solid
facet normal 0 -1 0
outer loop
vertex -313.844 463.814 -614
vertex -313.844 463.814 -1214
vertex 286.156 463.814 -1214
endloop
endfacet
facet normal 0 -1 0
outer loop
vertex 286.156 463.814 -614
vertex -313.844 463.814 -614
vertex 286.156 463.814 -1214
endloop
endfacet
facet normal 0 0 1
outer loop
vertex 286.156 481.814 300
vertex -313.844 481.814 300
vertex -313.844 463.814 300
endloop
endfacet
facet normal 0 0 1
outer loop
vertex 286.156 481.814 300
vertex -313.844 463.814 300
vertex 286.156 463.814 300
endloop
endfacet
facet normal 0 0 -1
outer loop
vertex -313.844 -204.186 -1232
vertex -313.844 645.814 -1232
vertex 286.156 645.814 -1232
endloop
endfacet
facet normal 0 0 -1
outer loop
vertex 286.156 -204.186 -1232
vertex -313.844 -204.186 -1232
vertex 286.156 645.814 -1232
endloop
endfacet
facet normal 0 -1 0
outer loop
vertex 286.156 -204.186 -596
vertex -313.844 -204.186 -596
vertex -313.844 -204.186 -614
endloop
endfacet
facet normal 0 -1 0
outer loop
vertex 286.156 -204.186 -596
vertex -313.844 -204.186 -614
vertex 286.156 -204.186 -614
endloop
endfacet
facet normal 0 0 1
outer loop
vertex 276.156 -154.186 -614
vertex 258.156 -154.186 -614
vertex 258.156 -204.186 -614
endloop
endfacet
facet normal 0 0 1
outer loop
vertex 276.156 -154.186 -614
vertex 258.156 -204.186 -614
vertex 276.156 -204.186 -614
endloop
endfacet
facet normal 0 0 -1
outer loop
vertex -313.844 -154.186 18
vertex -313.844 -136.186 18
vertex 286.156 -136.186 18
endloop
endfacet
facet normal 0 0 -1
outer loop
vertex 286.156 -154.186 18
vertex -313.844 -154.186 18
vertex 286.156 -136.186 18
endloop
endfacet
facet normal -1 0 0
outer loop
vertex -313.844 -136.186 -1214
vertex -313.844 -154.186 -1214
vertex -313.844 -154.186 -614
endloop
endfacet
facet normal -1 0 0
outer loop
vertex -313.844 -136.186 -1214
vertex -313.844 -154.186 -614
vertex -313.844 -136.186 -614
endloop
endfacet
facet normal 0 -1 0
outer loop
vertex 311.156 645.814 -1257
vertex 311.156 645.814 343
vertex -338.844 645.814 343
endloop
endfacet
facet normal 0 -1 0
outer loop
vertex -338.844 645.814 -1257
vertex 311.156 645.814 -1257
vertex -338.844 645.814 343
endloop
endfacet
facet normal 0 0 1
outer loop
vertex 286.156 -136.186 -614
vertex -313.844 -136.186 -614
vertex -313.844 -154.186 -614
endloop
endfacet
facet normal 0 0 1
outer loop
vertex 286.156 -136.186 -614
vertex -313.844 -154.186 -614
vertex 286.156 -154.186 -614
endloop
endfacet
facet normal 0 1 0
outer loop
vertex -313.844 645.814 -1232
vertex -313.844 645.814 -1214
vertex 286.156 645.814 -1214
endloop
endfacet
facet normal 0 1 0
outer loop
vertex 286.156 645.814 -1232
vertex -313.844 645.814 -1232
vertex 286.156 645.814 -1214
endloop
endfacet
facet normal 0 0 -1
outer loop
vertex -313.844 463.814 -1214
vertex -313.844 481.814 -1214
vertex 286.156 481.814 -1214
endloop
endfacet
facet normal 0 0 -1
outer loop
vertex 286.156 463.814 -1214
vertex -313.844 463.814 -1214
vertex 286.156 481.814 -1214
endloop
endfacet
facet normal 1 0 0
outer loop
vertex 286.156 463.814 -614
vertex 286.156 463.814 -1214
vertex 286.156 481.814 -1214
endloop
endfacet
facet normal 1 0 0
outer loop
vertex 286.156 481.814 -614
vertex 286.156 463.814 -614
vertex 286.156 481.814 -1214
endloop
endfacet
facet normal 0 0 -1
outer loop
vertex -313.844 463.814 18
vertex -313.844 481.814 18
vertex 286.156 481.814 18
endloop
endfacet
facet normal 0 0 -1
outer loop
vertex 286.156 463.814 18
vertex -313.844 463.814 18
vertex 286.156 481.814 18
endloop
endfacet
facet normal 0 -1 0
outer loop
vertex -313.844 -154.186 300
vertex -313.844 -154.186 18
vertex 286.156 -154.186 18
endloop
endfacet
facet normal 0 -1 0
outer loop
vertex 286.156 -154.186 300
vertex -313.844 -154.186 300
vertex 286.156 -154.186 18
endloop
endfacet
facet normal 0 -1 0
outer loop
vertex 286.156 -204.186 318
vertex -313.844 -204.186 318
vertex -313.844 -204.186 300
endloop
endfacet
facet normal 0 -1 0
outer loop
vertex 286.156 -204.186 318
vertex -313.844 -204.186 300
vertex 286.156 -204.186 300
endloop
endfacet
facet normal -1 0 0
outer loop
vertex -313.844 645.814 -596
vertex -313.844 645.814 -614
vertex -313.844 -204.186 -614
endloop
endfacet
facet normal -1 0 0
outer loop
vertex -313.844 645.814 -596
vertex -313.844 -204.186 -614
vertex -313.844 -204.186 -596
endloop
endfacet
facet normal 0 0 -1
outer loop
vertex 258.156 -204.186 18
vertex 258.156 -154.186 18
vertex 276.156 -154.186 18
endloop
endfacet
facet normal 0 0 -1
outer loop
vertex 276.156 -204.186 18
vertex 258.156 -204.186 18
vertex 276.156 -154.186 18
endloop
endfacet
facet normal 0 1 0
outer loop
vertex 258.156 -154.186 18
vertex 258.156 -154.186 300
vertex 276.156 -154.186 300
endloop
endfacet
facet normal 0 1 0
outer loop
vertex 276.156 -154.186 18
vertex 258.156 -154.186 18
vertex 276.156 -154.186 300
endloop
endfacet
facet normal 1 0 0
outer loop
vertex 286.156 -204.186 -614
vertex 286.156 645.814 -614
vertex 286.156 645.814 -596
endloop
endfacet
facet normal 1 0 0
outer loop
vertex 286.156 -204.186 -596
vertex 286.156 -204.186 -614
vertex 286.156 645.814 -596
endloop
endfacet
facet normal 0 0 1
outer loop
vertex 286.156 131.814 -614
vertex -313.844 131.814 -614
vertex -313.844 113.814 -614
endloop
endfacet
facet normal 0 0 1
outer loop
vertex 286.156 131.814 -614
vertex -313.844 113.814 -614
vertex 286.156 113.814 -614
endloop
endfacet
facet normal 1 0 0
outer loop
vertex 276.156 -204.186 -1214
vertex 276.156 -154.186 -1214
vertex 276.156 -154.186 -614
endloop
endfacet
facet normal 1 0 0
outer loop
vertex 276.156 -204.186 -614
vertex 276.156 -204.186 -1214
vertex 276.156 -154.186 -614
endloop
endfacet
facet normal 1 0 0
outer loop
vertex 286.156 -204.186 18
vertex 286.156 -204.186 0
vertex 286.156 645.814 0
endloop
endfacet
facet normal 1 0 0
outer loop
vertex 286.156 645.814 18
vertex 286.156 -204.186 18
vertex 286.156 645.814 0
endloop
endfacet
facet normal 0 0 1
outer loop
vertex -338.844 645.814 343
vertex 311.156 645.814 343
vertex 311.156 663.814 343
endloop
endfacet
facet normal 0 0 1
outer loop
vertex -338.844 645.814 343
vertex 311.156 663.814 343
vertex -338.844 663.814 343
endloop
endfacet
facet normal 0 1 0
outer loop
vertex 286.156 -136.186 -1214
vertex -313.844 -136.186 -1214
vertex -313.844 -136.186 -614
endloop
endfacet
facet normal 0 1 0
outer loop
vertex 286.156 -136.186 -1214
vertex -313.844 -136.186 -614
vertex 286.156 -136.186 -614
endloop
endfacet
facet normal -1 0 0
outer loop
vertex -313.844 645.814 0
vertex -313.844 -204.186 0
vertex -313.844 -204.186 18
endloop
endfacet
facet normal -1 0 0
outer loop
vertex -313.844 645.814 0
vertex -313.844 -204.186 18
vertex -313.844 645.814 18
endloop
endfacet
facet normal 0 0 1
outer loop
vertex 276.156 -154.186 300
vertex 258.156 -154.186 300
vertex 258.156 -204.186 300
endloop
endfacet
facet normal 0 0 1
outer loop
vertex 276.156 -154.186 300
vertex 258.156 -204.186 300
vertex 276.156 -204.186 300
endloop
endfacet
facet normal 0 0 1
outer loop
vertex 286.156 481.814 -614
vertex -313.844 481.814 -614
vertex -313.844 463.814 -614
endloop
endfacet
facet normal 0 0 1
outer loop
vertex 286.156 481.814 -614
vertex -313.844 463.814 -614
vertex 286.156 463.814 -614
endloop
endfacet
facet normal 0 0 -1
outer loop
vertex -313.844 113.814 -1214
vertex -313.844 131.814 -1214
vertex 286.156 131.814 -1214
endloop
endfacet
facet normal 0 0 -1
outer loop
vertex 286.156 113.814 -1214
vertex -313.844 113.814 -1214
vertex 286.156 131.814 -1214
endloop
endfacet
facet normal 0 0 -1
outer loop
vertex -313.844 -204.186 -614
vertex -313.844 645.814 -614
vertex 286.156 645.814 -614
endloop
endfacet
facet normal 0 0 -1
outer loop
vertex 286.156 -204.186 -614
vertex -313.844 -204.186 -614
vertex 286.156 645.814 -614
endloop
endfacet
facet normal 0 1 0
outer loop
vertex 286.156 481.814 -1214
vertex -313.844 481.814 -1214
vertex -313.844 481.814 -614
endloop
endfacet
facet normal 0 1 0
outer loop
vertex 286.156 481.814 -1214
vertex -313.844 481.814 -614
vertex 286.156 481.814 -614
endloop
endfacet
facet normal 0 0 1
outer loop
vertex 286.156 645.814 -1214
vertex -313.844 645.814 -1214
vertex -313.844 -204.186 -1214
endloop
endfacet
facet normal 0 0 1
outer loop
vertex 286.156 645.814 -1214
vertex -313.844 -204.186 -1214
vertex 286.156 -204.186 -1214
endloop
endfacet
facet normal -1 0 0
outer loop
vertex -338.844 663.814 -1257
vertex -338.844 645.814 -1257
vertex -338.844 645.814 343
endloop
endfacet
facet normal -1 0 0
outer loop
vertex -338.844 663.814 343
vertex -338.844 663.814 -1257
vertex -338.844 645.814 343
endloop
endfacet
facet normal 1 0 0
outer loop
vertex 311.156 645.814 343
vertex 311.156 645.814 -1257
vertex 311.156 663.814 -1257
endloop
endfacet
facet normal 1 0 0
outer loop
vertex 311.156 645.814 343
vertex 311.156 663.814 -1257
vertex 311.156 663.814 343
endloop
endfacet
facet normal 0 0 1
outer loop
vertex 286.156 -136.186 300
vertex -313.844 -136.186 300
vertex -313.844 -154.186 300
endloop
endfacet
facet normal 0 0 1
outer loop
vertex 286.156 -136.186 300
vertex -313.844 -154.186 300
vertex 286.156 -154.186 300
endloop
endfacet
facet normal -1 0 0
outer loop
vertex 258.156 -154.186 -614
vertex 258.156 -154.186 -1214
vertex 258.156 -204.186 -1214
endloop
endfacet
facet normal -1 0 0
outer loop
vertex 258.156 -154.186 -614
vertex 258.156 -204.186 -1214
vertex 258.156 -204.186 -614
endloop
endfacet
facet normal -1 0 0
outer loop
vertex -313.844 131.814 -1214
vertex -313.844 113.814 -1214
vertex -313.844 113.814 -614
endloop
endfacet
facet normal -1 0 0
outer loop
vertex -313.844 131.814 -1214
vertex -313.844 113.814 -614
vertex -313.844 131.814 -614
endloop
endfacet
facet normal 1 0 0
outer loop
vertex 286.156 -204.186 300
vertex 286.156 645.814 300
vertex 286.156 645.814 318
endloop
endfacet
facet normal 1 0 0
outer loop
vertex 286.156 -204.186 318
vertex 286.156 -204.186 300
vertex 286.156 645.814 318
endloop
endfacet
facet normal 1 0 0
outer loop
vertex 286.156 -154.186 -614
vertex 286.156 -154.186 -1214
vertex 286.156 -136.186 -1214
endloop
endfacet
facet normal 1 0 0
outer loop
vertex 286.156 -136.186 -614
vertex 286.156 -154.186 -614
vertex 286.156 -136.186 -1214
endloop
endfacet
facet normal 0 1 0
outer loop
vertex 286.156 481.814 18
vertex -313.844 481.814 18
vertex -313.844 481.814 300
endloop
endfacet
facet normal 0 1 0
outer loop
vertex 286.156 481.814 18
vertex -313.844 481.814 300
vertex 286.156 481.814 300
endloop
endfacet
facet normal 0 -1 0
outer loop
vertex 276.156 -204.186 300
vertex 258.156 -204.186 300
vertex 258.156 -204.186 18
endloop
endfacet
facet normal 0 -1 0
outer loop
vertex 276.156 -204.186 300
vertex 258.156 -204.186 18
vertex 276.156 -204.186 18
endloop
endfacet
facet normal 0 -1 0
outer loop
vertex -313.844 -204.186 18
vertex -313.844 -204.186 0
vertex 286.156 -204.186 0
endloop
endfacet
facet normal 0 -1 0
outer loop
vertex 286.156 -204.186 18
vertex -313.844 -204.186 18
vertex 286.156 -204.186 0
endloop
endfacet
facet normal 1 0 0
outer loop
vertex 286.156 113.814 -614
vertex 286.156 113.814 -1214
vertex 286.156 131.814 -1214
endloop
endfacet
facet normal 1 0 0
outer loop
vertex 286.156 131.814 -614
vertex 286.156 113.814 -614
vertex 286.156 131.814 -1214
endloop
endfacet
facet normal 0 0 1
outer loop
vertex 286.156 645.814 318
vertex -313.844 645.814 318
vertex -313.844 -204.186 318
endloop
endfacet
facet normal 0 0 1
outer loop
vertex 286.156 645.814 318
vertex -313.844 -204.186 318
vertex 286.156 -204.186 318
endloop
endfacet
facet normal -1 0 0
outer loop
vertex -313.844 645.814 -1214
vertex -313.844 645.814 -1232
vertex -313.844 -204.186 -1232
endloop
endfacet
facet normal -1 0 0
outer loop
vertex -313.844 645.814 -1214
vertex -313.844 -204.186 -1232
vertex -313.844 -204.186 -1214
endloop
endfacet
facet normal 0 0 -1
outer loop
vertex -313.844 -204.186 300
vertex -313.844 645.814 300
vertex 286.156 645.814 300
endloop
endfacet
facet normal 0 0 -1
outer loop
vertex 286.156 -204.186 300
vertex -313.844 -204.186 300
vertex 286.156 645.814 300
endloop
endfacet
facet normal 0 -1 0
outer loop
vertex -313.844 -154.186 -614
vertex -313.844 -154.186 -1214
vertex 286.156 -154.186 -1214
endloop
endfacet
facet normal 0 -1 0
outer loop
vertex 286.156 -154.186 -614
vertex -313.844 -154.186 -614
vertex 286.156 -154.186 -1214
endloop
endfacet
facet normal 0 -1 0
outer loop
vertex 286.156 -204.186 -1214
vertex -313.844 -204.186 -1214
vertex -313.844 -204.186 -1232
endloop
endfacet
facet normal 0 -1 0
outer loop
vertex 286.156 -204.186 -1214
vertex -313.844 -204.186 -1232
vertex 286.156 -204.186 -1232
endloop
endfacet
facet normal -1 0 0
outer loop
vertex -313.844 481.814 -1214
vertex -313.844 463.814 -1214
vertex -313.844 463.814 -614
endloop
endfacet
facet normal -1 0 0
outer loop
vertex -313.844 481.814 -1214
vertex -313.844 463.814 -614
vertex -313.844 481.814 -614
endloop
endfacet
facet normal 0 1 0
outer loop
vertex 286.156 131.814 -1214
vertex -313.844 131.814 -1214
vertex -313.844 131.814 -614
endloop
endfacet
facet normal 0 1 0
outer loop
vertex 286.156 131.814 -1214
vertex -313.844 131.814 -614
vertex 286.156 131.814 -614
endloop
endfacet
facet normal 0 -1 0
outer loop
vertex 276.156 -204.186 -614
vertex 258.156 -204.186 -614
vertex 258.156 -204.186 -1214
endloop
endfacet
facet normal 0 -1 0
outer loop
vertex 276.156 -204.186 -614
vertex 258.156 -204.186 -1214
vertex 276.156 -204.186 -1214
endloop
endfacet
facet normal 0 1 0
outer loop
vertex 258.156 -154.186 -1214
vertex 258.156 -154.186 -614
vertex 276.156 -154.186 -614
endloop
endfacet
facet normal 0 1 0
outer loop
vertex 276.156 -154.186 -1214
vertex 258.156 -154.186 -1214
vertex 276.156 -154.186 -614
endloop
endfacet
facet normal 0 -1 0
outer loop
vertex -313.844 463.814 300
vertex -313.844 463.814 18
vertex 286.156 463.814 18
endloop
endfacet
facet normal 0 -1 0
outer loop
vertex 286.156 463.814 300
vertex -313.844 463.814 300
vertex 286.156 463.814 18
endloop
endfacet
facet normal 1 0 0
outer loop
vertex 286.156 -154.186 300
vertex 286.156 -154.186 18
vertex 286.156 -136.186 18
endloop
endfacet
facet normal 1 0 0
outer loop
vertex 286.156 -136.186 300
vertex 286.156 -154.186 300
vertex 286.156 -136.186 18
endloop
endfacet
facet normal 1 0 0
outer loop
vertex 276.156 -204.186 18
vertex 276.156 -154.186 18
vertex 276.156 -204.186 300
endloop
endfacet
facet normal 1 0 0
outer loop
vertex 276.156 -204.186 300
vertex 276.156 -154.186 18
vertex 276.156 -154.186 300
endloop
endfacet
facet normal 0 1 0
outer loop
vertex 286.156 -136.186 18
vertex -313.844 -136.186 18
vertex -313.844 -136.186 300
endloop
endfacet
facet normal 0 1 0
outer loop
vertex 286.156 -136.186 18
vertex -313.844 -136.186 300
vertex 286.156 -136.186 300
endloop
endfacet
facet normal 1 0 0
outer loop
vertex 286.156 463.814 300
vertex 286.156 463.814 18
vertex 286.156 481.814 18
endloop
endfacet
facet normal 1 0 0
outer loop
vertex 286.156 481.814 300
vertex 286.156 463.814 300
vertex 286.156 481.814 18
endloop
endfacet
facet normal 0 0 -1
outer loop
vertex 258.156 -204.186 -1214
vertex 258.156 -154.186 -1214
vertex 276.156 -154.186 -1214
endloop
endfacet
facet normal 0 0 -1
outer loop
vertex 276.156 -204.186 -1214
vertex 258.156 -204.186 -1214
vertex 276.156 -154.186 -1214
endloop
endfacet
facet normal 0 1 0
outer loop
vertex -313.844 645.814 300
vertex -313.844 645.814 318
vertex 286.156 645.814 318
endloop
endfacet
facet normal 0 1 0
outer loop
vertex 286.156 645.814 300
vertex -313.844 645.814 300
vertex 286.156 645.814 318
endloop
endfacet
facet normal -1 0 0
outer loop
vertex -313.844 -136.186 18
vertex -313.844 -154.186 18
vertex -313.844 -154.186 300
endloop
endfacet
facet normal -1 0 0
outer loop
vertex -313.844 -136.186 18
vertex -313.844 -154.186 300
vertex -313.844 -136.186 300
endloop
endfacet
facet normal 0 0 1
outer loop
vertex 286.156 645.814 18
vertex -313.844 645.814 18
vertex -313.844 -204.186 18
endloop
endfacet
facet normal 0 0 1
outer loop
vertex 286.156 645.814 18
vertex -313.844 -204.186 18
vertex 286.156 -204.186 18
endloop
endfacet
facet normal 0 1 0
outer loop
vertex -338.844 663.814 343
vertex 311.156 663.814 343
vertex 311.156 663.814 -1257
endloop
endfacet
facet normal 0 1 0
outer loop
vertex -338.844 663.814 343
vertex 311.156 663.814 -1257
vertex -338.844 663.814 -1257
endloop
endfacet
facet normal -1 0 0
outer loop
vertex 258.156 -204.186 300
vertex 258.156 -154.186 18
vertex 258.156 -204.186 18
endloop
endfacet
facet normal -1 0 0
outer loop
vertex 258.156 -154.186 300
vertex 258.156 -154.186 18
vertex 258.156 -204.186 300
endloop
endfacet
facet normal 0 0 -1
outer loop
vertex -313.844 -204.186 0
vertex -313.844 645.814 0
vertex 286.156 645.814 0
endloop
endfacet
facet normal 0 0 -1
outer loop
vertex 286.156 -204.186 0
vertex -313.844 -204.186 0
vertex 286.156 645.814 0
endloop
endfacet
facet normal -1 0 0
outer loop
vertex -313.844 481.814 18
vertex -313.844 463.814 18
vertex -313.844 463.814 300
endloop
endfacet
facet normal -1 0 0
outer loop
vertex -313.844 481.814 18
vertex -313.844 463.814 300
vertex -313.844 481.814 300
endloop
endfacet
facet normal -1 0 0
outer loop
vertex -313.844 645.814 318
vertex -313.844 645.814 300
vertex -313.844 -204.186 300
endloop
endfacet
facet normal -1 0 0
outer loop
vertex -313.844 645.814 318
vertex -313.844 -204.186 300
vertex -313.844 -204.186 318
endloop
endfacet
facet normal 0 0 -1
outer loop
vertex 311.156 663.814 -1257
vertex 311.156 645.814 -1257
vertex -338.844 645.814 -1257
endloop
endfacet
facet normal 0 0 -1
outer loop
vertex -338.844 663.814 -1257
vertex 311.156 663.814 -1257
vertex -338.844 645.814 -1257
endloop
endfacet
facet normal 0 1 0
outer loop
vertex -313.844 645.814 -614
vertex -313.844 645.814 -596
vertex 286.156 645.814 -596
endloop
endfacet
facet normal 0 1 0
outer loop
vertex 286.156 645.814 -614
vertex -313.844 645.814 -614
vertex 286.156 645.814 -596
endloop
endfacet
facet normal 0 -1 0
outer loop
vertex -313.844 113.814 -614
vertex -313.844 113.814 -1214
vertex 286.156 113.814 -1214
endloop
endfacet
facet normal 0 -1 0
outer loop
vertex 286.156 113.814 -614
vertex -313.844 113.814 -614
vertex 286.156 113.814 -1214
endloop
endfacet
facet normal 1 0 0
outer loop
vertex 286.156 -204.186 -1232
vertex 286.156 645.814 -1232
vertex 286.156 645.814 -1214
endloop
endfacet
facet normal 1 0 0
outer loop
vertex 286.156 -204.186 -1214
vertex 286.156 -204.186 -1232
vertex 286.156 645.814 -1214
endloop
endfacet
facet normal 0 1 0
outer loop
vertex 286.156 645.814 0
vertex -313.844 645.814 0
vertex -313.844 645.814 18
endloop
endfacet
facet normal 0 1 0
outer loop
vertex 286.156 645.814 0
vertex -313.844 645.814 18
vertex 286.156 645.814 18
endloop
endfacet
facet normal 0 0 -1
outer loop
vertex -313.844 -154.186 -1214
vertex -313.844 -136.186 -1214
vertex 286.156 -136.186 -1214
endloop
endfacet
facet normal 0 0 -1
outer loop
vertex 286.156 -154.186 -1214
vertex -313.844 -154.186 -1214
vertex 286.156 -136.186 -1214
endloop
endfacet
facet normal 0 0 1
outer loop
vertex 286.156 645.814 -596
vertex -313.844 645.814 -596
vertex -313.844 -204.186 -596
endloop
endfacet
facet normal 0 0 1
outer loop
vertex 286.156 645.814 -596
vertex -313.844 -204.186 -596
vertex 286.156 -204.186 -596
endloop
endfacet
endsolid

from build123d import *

# Parameters (mm, degrees)
F0_W      = 600
F0_H      = 850
F1_DEPTH  = 18
F2_W      = 650
F2_H      = 1600
F3_DEPTH  = 18
F4_W      = 600
F4_H      = 18
F5_DEPTH  = 850
F6_W      = 600
F6_H      = 18
F7_DEPTH  = 600
F8_W      = 600
F8_H      = 18
F9_DEPTH  = 282
F10_W     = 18
F10_H     = 282
F10_H_2   = 600
F11_DEPTH = 50


with BuildPart() as f1:
    # F0 (on Top) → F1 (new body)
    with BuildSketch(Plane.XY):
        with Locations((-13.843969, 220.814227)):
            Rectangle(F0_W, F0_H)
    extrude(amount=F1_DEPTH)


with BuildPart() as f3:
    # F2 (on face) → F3 (new body)
    with BuildSketch(Plane(origin=(0, 645.814227, 0), x_dir=(-1, 0, 0), z_dir=(0, 1, 0))):
        with Locations((13.843969, -457)):
            Rectangle(F2_W, F2_H)
    extrude(amount=F3_DEPTH)


with BuildPart() as f5:
    # F4 (on face) → F5 (new body, through all)
    with BuildSketch(Plane.XZ.offset(-645.814227)):
        with Locations((-13.843969, -605)):
            Rectangle(F4_W, F4_H)
        with Locations((-13.843969, -1223)):
            Rectangle(F4_W, F4_H)
        with Locations((-13.843969, 309)):
            Rectangle(F4_W, F4_H)
    extrude(amount=F5_DEPTH)


with BuildPart() as f7:
    # F6 (on face) → F7 (new body, through all)
    with BuildSketch(Plane.XY.offset(-1214)):
        with Locations((-13.843969, -145.185773)):
            Rectangle(F6_W, F6_H)
        with Locations((-13.843969, 472.814227)):
            Rectangle(F6_W, F6_H)
        with Locations((-13.843969, 122.814227)):
            Rectangle(F6_W, F6_H)
    extrude(amount=F7_DEPTH)


with BuildPart() as f9:
    # F8 (on face) → F9 (new body, through all)
    with BuildSketch(Plane.XY.offset(18)):
        with Locations((-13.843969, 472.814227)):
            Rectangle(F8_W, F8_H)
        with Locations((-13.843969, -145.185773)):
            Rectangle(F8_W, F8_H)
    extrude(amount=F9_DEPTH)


with BuildPart() as f11:
    # F10 (on face) → F11 (new body, through all)
    with BuildSketch(Plane.XZ.offset(154.185773)):
        with Locations((267.156031, 159)):
            Rectangle(F10_W, F10_H)
        with Locations((267.156031, -914)):
            Rectangle(F10_W, F10_H_2)
    extrude(amount=F11_DEPTH)


solid = Compound([f1.part, f3.part, f5.part, f7.part, f9.part, f11.part])
